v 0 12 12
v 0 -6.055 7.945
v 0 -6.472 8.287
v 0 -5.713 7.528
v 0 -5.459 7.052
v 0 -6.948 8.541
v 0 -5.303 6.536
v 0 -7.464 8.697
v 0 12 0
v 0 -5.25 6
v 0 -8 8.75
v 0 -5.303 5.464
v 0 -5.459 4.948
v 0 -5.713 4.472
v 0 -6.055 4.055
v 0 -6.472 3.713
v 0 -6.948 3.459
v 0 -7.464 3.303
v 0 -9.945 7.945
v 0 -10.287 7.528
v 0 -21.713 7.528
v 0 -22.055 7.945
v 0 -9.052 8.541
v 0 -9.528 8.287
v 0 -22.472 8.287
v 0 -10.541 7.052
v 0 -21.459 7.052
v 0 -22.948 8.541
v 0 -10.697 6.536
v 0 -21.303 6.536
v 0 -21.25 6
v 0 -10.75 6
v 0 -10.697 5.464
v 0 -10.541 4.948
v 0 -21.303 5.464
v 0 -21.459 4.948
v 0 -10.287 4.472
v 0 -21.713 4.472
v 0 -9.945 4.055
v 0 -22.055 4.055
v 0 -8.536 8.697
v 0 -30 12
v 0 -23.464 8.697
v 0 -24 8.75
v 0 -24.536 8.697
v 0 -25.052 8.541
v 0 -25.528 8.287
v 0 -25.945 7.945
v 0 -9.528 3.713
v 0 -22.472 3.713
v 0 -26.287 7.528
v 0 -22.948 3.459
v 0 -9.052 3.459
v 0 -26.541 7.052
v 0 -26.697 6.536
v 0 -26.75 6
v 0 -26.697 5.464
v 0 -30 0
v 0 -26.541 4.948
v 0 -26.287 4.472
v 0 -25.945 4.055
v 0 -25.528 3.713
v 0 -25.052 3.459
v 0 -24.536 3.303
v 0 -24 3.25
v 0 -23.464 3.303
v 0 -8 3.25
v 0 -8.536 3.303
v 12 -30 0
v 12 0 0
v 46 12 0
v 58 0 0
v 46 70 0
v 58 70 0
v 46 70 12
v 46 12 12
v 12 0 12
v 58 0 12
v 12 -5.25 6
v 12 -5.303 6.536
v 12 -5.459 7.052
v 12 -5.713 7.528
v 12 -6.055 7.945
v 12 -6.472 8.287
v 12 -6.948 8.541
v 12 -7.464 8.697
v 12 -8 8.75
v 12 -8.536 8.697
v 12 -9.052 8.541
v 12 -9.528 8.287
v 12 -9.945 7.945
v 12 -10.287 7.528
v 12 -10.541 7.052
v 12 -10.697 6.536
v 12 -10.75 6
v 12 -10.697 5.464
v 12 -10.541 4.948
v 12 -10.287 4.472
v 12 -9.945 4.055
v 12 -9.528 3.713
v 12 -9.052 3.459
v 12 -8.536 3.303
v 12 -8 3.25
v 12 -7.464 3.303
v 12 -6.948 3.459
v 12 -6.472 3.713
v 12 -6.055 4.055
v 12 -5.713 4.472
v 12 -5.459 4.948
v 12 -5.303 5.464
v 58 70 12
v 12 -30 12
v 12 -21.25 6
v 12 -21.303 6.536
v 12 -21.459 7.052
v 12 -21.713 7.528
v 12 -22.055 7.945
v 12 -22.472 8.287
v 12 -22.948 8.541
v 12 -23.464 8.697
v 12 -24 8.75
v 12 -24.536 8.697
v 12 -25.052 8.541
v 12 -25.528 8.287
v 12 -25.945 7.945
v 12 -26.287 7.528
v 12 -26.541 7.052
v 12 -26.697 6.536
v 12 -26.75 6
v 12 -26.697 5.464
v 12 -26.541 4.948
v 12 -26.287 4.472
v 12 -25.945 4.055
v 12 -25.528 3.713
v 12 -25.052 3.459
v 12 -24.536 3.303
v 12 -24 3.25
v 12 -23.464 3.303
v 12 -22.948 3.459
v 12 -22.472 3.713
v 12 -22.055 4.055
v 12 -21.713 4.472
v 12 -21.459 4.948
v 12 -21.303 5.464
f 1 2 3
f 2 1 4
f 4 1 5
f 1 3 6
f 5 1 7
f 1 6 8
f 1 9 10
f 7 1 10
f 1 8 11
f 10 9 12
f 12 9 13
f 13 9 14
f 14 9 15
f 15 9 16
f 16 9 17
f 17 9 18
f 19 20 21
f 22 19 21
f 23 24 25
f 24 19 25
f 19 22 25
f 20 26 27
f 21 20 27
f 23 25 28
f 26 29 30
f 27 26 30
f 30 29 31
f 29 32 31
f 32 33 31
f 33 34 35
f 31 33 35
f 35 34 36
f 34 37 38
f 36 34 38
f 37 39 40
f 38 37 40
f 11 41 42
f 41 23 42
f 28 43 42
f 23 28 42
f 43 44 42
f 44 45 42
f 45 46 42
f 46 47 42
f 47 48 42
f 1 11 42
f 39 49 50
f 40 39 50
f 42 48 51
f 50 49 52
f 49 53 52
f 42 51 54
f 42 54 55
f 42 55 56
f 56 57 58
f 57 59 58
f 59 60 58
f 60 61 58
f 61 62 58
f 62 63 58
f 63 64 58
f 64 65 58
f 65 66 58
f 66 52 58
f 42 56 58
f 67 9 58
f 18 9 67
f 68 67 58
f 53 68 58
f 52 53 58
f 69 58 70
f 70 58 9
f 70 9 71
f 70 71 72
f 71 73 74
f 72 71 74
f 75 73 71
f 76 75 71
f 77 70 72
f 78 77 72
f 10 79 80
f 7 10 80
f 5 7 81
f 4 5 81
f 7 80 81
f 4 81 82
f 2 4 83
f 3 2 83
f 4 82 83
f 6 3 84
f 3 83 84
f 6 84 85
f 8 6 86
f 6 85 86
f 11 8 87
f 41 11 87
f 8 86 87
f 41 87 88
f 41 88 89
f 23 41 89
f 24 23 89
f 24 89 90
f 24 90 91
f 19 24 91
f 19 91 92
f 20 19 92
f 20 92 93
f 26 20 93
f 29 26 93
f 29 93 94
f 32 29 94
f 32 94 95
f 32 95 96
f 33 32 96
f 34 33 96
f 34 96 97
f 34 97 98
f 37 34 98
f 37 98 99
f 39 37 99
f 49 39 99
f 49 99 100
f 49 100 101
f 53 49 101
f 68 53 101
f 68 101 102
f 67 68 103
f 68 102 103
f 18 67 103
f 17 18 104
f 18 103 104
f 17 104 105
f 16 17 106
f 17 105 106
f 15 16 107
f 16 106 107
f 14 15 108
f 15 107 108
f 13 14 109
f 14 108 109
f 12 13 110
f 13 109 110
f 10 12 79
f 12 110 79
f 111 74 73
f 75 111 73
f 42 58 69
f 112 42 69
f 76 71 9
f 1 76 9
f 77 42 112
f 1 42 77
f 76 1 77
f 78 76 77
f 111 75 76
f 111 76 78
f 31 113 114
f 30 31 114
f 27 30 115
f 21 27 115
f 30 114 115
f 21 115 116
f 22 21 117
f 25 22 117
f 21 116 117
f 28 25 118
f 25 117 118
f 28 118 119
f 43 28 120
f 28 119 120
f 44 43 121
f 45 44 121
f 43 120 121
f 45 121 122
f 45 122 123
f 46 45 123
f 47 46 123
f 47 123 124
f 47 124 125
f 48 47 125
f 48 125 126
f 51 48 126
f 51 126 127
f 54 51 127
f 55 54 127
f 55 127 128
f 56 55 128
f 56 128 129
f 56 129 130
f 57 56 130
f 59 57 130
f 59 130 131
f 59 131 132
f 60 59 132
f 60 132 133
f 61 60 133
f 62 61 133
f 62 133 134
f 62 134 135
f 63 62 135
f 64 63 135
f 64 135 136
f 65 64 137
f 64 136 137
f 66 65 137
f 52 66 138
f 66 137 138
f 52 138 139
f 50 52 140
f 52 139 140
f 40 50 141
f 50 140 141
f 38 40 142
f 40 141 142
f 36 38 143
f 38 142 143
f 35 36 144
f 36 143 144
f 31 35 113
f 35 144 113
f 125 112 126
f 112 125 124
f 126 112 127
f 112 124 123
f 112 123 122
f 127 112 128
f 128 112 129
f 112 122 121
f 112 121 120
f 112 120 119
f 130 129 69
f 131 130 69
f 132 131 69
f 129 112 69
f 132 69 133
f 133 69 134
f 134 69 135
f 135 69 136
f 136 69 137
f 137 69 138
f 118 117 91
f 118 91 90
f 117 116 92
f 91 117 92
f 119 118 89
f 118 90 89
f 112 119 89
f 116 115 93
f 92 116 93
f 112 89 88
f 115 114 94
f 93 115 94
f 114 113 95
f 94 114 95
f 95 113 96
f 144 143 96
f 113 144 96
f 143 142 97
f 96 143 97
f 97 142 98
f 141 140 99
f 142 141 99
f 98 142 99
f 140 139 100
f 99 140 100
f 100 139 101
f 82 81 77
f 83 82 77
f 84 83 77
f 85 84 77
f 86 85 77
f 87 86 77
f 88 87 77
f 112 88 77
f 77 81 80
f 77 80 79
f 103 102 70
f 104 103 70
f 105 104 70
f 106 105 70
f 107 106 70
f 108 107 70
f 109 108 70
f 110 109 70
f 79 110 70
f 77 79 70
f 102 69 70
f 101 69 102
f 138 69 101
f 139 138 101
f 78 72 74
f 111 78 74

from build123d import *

# Parameters (mm, degrees)
F1_DEPTH = 12
F2_R     = 2.75
F3_DEPTH = 12.001


with BuildPart() as f1:
    # F0 (on Top) → F1 (new body)
    with BuildSketch(Plane.XY):
        Polygon((0, 12), (0, 0), (0, -30), (12, -30), (12, 0), (58, 0), (58, 70), (46, 70), (46, 12), align=None)
    extrude(amount=F1_DEPTH)

    # F2 (on face) → F3 (cut, through all)
    with BuildSketch(Plane.YZ.offset(12)):
        with Locations((-24, 6)):
            Circle(F2_R)
        with Locations((-8, 6)):
            Circle(F2_R)
    extrude(amount=-F3_DEPTH, mode=Mode.SUBTRACT)


solid = f1.part
